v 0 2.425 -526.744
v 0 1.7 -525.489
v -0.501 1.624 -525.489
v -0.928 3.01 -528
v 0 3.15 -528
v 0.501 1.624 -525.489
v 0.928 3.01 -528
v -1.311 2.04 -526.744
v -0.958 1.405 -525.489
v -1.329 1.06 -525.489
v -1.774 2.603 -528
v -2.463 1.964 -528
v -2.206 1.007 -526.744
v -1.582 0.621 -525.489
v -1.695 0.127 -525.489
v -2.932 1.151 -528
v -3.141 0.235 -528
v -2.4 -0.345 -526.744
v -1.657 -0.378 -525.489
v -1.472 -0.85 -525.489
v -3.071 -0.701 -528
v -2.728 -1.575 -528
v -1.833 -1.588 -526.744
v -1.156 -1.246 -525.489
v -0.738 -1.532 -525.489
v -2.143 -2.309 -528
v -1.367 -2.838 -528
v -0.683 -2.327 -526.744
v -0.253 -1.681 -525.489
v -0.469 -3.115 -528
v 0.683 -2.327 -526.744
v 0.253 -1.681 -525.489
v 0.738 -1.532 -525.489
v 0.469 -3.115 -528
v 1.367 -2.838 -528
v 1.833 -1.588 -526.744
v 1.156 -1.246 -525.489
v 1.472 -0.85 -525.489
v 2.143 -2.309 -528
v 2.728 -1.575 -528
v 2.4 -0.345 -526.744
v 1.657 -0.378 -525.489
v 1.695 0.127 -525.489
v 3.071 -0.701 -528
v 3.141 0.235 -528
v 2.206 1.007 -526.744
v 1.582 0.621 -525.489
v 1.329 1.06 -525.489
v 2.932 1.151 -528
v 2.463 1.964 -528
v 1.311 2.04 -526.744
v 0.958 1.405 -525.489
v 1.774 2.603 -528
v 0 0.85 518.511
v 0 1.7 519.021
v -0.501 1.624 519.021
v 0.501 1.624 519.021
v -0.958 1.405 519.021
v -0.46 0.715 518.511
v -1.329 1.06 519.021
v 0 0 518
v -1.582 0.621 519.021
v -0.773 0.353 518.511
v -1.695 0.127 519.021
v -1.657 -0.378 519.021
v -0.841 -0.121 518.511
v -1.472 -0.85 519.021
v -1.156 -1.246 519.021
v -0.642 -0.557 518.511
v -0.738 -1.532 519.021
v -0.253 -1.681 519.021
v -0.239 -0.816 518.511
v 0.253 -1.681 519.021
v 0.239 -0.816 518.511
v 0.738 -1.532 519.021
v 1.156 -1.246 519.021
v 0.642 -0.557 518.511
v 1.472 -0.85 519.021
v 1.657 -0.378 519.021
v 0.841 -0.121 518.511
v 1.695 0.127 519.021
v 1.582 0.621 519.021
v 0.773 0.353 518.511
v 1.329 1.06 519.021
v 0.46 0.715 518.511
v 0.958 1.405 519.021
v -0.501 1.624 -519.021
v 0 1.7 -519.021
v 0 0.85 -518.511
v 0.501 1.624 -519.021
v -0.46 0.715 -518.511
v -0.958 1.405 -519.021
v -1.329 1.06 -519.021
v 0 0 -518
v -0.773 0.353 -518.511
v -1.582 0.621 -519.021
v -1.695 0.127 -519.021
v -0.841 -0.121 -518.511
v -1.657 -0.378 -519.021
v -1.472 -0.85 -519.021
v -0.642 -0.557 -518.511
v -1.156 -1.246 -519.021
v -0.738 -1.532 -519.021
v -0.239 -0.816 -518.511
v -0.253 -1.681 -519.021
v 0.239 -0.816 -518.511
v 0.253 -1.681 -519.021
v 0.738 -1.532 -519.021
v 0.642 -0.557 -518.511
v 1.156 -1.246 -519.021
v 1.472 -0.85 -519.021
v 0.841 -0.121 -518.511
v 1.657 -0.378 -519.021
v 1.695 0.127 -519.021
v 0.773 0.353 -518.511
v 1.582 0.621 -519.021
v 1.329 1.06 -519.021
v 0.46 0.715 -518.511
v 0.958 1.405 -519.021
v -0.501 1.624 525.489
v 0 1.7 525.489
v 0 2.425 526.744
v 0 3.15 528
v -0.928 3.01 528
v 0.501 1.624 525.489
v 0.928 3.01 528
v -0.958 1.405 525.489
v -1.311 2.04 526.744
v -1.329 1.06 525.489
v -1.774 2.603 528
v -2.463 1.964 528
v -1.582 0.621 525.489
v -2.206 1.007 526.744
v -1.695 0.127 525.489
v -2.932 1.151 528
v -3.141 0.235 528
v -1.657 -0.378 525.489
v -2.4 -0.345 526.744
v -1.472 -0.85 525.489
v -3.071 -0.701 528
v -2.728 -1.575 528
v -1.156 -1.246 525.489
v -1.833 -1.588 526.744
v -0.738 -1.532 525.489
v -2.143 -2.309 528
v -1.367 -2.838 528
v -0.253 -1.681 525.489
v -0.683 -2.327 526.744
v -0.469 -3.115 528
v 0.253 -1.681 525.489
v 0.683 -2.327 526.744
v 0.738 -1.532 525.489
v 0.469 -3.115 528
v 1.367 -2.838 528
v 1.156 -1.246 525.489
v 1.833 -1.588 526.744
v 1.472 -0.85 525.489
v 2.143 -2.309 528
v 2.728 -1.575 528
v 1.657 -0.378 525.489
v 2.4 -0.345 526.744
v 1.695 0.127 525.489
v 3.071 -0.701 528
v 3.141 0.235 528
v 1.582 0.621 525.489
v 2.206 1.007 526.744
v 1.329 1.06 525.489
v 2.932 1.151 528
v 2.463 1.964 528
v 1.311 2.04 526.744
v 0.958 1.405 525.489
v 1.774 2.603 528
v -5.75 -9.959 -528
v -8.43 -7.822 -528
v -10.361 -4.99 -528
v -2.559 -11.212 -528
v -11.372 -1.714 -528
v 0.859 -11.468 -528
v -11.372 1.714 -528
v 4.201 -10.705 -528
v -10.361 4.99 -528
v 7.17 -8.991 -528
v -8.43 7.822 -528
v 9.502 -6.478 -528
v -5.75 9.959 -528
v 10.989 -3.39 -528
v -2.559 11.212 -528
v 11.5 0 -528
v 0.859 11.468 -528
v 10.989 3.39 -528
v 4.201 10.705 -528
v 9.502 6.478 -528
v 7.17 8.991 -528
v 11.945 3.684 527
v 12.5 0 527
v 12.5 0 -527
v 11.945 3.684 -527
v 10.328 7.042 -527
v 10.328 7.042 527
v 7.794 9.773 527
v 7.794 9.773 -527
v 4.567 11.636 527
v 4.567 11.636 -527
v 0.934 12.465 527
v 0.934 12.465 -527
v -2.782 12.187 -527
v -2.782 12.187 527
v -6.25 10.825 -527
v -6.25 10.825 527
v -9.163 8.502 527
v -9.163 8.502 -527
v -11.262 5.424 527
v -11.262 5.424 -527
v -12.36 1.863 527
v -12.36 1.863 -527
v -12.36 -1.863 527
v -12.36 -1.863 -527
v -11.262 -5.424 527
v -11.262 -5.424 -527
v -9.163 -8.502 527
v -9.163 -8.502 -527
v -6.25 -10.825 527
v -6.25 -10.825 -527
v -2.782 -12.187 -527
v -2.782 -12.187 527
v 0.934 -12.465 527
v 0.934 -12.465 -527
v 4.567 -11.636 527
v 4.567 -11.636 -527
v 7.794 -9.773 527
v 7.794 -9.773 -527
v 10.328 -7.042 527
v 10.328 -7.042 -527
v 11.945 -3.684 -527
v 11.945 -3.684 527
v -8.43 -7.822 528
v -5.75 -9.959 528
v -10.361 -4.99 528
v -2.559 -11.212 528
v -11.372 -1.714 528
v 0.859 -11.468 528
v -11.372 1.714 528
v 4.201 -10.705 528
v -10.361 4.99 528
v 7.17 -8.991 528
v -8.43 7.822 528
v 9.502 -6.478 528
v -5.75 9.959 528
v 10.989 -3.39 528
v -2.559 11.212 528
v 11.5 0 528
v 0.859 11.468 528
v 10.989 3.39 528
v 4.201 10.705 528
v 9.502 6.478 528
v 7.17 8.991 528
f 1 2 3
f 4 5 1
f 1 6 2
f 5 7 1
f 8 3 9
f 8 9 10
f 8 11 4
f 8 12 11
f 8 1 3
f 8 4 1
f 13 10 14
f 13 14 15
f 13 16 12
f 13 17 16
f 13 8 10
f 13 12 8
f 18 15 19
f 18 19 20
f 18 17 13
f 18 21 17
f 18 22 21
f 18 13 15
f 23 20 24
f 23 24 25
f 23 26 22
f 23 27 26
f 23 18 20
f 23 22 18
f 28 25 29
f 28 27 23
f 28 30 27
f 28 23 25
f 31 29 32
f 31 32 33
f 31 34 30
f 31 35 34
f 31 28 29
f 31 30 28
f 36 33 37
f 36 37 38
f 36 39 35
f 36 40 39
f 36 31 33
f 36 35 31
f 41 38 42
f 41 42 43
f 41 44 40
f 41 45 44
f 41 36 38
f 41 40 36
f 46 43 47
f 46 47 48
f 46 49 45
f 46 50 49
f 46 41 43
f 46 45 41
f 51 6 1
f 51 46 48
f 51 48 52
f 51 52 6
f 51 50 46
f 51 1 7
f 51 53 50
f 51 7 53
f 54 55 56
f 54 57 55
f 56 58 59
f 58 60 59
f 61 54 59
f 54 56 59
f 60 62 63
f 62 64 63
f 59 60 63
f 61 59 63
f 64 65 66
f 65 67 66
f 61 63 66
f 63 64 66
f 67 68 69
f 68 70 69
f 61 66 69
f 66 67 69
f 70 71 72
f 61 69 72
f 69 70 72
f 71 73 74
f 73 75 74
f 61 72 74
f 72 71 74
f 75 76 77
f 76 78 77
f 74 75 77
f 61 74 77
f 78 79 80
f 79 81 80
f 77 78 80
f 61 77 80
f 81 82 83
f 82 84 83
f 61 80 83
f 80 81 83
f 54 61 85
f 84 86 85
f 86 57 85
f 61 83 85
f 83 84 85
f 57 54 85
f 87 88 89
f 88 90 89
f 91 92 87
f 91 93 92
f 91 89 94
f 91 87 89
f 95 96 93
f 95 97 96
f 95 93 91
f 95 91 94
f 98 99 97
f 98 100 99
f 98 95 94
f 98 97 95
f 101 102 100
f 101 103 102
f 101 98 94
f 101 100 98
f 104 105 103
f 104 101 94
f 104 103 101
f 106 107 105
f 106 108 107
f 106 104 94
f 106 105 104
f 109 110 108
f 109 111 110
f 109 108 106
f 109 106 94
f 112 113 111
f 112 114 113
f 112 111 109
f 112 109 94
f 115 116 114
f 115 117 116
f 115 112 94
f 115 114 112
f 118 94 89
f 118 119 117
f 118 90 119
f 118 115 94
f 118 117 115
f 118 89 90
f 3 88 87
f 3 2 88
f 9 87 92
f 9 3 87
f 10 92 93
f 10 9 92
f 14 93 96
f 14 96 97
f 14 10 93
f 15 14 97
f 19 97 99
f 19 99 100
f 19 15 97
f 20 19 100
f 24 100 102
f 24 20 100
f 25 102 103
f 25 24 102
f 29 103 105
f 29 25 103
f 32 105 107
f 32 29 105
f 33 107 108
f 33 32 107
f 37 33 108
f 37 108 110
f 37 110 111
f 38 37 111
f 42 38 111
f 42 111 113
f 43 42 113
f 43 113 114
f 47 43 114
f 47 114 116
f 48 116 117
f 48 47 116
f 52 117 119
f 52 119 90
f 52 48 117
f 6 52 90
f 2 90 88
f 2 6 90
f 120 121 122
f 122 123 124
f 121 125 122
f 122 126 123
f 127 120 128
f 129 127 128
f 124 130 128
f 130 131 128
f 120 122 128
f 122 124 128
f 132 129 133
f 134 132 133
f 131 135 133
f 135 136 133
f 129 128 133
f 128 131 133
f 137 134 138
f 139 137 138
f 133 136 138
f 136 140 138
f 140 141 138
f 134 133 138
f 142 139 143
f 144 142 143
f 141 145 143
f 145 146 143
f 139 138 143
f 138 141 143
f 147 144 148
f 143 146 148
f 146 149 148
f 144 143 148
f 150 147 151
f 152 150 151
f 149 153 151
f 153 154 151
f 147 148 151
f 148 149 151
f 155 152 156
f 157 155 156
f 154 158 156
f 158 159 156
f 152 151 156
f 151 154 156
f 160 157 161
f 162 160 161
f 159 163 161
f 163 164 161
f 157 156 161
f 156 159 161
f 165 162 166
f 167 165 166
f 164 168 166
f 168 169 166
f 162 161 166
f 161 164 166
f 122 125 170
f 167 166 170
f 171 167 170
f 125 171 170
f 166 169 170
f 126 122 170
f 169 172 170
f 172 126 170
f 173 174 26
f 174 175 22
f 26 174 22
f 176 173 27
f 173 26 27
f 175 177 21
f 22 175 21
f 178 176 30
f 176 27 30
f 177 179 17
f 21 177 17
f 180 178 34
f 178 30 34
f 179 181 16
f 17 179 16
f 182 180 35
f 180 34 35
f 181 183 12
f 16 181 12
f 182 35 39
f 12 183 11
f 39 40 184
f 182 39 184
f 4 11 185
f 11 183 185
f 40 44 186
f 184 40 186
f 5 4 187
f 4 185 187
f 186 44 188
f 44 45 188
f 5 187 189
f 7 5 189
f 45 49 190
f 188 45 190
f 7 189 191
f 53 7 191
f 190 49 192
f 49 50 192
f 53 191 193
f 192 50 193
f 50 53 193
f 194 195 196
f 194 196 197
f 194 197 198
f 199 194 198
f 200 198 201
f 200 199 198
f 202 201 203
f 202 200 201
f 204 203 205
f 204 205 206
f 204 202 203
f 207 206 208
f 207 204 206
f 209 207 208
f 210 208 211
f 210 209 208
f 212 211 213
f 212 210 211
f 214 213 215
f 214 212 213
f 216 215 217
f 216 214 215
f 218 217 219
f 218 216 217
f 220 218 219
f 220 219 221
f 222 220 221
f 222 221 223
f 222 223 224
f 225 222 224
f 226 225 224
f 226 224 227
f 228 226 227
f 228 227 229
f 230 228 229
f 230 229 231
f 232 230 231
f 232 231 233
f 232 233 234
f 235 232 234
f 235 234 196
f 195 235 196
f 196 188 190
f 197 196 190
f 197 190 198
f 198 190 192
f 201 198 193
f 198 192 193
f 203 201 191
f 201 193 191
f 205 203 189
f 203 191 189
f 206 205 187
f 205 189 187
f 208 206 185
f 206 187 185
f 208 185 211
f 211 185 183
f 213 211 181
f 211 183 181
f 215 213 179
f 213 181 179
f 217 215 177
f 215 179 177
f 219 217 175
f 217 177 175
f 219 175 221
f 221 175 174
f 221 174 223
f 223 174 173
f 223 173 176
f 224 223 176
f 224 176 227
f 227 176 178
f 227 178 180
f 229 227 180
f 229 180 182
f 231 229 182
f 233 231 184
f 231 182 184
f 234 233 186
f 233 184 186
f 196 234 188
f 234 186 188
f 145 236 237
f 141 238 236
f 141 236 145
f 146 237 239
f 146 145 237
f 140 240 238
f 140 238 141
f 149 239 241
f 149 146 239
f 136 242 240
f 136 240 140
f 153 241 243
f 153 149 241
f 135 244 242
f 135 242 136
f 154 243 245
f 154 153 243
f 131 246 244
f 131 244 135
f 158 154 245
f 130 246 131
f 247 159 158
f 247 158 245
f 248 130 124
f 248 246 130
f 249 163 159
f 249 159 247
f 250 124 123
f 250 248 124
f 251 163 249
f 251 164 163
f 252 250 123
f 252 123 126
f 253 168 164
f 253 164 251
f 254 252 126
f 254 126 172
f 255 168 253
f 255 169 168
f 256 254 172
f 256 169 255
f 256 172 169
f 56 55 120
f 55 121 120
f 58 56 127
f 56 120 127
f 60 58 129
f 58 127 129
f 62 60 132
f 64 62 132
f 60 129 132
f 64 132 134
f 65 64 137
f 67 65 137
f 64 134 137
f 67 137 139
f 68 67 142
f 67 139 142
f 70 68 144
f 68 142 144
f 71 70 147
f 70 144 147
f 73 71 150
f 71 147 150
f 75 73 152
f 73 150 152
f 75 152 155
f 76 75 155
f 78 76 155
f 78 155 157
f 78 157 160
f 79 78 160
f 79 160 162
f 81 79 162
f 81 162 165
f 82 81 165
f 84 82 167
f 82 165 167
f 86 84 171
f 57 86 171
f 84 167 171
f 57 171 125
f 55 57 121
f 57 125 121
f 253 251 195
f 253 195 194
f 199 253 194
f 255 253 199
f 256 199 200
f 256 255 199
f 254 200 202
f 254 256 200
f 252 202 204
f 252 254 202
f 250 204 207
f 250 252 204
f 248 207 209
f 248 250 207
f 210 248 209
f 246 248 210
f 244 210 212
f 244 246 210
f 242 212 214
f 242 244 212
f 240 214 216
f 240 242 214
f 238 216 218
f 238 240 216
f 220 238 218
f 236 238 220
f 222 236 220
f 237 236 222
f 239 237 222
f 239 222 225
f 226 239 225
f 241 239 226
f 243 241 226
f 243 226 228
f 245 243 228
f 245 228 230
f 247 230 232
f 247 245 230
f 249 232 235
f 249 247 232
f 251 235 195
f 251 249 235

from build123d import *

# Parameters (mm, degrees)
SKETCH1_R           = 12.5
CORPO_25_1056_DEPTH = 528
CHANFRO_1_45_SIZE   = 1


with BuildPart() as part:
    # Sketch1 → Corpo Ø25×1056 (new, symmetric)
    with BuildSketch(Plane.XY):
        Circle(SKETCH1_R)
    extrude(amount=CORPO_25_1056_DEPTH, both=True)

    # Sketch4 → Furo de Centro (revolve, cut)
    with BuildSketch(Plane(origin=(0, 0, -528), x_dir=(0, 1, 0), z_dir=(1, 0, 0))):
        Polygon((0, 0), (0, 10), (1.7, 8.978536948), (1.7, 2.511473671), (3.15, 0), align=None)
    furo_de_centro = revolve(axis=Axis((0, 0, -534.35), (0, 0, 1)), mode=Mode.SUBTRACT)

    # Furo de Centro Espelhado: Furo de Centro across plane
    add(furo_de_centro.mirror(Plane.XY), mode=Mode.SUBTRACT)

    # Chanfro 1×45°
    chanfro_1_45_edges = [part.edges().sort_by_distance(p)[0] for p in [
        (-12.5, 0, -528),
        (-12.5, 0, 528),
    ]]
    chamfer(chanfro_1_45_edges, length=CHANFRO_1_45_SIZE)


solid = part.part
